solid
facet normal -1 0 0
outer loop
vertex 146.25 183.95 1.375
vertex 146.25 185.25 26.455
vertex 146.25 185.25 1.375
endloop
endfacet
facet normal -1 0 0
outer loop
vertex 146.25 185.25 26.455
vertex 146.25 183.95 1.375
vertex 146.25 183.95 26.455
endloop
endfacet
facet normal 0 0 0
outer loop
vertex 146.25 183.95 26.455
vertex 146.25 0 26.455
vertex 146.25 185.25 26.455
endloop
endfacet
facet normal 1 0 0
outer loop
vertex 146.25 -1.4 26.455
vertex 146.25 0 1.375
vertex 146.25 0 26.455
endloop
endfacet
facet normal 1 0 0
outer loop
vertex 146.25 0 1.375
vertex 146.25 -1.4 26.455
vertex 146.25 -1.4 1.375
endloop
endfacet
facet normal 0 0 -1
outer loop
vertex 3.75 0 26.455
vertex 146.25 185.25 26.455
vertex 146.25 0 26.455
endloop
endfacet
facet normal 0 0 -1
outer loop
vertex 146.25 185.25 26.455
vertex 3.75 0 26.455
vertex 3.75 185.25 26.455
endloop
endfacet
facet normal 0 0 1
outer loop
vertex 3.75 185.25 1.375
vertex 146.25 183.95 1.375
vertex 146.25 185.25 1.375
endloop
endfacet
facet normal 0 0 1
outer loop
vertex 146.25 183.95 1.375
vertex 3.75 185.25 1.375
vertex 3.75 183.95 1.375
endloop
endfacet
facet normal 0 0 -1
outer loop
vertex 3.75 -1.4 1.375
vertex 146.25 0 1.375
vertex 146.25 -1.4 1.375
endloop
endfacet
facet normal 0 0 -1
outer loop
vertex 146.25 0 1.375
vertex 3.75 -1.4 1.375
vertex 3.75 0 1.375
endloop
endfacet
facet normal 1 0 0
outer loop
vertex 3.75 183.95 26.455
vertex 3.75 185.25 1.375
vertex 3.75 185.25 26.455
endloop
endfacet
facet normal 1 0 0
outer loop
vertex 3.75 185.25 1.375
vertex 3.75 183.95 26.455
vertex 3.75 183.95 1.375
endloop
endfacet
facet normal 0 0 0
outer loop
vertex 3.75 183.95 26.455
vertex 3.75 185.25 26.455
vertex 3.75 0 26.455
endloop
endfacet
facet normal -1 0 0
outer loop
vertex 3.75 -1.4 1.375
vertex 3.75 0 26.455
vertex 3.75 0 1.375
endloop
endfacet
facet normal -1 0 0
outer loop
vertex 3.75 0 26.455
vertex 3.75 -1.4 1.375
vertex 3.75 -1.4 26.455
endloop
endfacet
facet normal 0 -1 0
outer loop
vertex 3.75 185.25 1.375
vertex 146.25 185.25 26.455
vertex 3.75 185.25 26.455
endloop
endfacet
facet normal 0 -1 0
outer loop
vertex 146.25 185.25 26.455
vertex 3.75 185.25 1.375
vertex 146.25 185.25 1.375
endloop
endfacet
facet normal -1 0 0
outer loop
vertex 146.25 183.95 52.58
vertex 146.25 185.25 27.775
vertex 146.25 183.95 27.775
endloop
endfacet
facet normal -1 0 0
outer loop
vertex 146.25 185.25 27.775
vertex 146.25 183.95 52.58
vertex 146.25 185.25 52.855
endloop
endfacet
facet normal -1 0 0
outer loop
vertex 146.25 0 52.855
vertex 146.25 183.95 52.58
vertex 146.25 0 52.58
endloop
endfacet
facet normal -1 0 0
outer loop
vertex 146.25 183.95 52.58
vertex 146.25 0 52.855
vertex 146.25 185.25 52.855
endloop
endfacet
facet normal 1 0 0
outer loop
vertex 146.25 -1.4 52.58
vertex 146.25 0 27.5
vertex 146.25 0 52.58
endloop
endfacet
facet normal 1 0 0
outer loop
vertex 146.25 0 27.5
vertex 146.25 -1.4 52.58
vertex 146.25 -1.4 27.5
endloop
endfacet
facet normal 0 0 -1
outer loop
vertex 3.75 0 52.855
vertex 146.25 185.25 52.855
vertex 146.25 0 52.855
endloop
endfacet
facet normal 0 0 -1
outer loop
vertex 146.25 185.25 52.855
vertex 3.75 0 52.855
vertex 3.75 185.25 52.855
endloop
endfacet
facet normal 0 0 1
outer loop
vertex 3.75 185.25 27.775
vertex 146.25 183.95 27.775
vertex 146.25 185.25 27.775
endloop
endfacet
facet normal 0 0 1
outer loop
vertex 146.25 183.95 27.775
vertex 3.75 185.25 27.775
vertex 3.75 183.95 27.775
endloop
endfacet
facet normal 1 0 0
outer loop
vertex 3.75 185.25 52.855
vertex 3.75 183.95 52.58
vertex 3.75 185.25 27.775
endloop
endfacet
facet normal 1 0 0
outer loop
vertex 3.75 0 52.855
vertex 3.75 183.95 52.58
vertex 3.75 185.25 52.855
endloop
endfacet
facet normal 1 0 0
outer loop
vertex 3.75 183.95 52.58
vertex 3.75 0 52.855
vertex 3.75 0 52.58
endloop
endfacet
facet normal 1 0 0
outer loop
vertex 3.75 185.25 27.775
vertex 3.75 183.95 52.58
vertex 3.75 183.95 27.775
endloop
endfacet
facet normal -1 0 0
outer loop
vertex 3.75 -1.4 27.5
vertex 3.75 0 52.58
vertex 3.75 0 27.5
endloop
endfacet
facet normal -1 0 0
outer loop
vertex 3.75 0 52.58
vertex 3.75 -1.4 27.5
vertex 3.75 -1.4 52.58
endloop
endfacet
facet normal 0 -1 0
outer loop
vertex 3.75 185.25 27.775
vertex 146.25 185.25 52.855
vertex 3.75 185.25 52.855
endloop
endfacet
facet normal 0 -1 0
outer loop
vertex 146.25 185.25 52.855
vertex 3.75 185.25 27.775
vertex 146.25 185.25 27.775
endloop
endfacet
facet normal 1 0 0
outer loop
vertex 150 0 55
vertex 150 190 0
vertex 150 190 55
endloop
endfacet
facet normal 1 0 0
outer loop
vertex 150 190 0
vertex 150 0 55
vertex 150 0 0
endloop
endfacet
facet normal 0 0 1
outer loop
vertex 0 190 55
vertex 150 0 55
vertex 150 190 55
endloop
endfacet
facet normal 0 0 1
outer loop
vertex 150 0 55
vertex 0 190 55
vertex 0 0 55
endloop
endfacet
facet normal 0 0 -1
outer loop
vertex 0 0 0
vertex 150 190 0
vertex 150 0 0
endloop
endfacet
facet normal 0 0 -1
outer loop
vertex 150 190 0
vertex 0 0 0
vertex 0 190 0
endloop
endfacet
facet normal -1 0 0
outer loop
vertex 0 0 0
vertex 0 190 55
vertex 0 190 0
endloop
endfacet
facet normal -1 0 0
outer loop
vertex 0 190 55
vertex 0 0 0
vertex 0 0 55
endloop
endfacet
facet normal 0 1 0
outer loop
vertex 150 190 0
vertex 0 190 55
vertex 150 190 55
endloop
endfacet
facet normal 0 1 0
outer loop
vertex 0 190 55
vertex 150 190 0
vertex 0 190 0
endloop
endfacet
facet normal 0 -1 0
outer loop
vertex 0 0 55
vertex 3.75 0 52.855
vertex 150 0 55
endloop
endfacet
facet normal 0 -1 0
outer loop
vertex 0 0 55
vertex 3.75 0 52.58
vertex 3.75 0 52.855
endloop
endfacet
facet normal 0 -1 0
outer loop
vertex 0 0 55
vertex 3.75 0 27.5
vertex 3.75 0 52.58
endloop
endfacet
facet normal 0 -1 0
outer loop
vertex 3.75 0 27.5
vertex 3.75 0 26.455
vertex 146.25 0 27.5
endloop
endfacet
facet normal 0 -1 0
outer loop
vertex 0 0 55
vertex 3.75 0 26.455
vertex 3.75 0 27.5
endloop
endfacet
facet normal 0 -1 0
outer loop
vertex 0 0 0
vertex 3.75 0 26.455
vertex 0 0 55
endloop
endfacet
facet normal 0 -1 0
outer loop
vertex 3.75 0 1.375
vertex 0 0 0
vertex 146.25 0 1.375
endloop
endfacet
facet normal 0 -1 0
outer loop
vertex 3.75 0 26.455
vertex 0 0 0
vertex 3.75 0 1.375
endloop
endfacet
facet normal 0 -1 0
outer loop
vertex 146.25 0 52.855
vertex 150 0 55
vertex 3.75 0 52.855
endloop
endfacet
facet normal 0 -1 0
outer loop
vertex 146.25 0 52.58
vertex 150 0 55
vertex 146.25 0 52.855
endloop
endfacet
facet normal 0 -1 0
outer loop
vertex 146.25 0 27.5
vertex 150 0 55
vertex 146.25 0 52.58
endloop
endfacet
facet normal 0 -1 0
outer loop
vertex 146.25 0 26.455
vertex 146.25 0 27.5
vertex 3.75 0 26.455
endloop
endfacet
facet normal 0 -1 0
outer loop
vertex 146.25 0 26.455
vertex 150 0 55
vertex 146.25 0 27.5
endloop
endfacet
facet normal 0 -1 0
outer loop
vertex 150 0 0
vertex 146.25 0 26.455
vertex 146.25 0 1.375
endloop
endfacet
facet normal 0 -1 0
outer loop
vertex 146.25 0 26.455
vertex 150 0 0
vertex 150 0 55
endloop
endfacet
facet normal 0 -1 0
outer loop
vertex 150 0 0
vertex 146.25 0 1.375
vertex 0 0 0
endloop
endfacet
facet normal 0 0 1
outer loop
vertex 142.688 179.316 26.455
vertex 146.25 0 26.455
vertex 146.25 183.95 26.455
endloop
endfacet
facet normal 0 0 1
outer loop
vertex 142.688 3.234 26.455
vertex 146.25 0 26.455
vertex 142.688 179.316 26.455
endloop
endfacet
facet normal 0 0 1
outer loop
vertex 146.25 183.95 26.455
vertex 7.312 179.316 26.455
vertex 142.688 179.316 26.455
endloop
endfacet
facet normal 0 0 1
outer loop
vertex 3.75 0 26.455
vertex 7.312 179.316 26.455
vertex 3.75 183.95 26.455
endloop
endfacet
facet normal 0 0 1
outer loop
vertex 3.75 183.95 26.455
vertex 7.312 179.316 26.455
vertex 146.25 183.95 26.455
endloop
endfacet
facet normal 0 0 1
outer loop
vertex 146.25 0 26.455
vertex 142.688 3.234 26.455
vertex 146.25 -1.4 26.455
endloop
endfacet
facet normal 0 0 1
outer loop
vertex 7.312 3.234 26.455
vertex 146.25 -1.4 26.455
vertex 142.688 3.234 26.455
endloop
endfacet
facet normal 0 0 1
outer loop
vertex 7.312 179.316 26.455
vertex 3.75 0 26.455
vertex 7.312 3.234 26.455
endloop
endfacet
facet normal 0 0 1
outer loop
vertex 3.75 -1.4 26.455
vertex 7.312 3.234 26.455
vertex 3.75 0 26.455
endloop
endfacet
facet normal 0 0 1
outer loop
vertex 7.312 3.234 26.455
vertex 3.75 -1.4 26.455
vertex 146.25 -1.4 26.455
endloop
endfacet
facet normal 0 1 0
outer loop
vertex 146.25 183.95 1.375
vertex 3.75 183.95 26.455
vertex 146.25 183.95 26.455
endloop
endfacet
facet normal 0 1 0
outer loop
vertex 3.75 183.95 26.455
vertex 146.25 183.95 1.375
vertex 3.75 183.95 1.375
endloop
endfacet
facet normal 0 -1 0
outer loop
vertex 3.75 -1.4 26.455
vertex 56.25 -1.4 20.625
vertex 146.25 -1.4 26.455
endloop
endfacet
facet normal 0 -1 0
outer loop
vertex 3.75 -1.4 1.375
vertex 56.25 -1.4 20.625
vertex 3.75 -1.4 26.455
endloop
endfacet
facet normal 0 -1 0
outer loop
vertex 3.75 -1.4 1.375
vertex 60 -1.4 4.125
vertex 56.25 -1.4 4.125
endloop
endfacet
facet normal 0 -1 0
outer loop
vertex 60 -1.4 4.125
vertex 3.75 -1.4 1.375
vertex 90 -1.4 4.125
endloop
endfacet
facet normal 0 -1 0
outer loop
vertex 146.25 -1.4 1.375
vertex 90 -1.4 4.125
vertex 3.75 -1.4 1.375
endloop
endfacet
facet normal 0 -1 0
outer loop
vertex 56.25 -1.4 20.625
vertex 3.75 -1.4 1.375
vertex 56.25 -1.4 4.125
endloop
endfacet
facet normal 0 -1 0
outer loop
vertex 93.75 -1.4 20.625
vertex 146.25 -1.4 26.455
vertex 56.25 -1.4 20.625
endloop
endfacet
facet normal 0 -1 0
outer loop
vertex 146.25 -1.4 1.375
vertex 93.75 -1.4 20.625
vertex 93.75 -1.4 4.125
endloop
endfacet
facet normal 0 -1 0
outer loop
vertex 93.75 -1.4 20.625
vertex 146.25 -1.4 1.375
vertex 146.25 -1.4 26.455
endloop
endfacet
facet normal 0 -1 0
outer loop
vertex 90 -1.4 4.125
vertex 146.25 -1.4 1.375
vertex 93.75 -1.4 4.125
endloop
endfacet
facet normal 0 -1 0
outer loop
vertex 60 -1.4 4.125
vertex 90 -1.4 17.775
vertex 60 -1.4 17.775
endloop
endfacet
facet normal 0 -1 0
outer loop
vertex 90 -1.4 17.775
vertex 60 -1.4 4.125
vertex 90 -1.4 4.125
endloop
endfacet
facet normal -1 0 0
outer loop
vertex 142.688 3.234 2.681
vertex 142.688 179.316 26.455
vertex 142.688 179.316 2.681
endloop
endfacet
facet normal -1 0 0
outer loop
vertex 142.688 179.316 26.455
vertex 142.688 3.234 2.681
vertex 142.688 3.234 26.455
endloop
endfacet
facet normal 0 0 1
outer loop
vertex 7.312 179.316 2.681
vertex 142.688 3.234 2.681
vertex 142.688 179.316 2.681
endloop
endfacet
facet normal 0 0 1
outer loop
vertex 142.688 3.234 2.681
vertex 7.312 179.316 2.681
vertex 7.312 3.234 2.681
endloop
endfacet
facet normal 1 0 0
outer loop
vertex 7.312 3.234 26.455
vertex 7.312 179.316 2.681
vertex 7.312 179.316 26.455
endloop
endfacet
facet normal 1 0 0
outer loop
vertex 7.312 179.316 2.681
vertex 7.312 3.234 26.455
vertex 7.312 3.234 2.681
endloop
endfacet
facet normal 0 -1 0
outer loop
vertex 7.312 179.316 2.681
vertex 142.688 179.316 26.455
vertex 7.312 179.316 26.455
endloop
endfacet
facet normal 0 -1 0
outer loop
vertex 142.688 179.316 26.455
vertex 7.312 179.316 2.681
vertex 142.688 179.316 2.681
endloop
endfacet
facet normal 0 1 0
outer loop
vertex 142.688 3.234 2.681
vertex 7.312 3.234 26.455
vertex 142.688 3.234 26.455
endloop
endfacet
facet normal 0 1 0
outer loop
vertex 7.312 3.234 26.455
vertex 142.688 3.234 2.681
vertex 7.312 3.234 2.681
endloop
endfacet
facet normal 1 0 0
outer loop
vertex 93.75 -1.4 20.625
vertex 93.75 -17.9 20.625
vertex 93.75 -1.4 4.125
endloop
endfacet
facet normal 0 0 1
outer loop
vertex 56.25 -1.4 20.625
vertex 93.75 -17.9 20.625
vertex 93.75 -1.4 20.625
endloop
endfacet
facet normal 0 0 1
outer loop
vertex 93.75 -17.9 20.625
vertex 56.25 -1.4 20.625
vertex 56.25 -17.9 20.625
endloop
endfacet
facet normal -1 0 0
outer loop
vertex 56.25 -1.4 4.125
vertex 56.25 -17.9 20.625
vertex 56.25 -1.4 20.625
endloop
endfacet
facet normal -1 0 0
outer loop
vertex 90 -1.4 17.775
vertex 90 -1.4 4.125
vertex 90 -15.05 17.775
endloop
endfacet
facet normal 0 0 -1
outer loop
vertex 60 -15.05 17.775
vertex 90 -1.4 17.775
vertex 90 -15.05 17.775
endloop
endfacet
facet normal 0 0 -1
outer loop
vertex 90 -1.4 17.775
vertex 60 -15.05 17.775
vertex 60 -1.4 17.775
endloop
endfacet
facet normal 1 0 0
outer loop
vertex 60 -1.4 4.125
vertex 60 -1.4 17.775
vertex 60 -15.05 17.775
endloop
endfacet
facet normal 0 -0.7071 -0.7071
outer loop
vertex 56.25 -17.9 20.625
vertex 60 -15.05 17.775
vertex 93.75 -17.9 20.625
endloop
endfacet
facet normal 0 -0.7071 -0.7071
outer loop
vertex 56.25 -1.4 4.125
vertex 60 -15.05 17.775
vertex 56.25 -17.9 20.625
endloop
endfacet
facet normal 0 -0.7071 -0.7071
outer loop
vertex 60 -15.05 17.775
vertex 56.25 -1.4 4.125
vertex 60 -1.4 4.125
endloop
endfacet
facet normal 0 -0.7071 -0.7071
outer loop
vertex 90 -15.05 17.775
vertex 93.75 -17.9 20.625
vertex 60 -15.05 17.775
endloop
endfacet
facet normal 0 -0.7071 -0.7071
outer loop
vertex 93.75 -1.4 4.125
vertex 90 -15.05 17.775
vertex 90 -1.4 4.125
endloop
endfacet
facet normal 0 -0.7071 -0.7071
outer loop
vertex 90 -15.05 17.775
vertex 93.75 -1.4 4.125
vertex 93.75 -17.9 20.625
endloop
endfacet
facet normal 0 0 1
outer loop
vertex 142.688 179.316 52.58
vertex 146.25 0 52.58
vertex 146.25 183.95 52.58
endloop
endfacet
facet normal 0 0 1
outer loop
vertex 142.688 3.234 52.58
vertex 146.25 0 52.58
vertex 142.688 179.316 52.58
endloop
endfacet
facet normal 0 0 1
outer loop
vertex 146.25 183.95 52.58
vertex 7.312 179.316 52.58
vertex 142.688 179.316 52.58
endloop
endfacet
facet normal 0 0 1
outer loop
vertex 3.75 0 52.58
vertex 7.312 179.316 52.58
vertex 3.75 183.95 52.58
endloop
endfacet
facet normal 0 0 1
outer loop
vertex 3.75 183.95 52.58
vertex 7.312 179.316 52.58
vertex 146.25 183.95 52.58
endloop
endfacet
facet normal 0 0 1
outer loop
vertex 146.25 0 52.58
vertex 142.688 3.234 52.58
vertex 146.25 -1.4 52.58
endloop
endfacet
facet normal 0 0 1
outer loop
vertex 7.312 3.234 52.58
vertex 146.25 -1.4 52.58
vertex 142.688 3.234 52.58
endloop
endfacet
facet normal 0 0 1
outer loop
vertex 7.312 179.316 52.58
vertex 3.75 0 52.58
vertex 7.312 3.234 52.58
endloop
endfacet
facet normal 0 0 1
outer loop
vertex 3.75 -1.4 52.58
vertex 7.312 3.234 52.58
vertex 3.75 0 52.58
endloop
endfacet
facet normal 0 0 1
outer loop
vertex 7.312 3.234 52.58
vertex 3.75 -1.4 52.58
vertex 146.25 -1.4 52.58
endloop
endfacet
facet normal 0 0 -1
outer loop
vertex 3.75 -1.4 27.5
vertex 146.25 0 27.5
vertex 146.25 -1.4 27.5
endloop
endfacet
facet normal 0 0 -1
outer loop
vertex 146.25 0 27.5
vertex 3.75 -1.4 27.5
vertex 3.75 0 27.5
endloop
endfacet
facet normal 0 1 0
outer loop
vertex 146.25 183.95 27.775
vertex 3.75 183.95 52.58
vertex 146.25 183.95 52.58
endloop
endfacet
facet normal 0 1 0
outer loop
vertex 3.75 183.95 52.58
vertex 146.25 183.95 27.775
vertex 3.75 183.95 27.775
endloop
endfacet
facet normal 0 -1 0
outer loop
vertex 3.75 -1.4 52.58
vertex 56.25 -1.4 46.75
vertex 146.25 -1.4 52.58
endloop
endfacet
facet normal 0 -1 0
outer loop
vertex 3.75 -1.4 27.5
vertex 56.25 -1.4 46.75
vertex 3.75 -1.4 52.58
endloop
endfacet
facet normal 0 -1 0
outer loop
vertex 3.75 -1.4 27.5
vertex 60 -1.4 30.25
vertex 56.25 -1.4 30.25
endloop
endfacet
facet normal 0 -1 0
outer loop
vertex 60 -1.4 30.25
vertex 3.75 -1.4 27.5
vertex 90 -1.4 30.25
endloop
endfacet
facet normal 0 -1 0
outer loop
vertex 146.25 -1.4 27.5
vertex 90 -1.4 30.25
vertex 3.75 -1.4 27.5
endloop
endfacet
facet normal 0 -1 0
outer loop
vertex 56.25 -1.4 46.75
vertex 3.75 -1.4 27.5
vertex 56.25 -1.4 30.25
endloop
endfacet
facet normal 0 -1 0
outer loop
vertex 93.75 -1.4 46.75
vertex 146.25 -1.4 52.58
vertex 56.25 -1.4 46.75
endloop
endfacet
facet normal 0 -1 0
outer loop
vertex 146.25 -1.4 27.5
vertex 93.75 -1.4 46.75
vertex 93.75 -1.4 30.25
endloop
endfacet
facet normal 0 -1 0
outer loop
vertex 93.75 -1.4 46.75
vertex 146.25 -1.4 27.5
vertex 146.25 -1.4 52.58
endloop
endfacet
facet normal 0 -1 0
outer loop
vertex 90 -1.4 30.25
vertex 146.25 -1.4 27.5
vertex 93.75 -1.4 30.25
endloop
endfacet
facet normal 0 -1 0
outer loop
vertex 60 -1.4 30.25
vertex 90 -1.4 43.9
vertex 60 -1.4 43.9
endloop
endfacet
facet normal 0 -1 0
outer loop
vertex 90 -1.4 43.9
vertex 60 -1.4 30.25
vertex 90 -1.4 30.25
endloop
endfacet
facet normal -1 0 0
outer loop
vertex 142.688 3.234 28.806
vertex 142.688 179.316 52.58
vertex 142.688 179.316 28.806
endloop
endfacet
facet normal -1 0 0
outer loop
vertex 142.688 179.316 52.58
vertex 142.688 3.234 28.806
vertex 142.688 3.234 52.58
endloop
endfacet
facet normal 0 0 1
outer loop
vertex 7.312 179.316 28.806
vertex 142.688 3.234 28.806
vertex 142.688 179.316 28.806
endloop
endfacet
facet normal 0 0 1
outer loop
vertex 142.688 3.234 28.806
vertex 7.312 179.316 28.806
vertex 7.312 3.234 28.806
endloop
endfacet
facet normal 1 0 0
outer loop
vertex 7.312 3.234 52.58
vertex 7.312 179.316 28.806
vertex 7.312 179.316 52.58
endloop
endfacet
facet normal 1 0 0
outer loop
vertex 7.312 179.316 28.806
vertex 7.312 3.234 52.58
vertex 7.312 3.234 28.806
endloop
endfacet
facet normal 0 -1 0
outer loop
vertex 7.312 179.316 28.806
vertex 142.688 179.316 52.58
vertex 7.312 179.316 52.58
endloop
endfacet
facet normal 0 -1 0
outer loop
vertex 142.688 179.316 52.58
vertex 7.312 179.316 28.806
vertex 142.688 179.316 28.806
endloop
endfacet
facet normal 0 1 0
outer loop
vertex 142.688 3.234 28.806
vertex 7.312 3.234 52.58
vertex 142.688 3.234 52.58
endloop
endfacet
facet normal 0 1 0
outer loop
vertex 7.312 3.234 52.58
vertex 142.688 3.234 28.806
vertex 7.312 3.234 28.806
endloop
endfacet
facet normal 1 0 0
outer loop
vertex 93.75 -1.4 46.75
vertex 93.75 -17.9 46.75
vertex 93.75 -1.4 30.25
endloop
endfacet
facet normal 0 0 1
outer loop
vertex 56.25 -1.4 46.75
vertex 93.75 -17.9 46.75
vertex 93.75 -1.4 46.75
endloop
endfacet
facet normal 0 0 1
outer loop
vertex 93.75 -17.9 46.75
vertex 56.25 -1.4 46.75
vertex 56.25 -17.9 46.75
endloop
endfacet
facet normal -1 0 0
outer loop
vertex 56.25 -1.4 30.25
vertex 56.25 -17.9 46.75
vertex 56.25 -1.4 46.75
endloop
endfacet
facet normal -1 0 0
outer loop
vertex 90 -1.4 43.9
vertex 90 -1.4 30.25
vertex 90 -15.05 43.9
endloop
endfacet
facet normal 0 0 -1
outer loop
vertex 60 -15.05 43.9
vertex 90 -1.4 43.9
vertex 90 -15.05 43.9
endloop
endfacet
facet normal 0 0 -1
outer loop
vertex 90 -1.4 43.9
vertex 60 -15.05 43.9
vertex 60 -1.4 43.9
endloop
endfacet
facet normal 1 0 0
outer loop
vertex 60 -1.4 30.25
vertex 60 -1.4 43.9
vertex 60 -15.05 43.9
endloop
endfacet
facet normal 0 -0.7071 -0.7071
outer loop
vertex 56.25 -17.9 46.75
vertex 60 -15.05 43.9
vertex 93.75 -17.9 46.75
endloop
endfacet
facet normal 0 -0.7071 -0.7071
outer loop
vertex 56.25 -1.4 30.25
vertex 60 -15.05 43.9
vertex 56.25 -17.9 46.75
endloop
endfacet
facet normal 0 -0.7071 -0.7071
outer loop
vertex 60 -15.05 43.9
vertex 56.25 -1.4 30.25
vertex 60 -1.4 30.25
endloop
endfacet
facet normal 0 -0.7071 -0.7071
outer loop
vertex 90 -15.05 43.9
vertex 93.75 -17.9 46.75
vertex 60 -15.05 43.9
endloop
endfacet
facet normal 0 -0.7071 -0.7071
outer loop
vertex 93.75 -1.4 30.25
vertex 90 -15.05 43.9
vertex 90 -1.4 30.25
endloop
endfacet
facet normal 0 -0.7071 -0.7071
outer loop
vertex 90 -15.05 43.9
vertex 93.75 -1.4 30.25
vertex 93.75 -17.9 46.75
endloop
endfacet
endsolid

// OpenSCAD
$fn=10;

width = 150;
length = 190;
heighth = 55;

module drawer_case(width, length, heighth){
	difference(){
		cube([width, length, heighth]);
		translate([(width*.05)/2,-.1,(heighth*.05)/2]){
			scale([1,1,.48]){
				cube([width-(width*.05),length-(length*.025)+.1,heighth-(heighth*.05)]);
				translate([0,0,heighth]){
					cube([width-(width*.05),length-(length*.025)+.1,heighth-(heighth*.05)]);
				}
			}
		}
	}
}

module drawer_shell(width, length, heighth){
	d_width = width-(width*.05);
	d_length = length-(length*.025)+.1;
	d_heighth = heighth-(heighth*.05);
	difference(){
		scale([1,1,.48]){
			cube([d_width, d_length, d_heighth]);
		}
		translate([(d_width*.05)/2,(d_length*.025),(d_heighth*.05)/2]){
			scale([.95,.95,.95]){
				cube([d_width, d_length,d_heighth*.48]);
			}
		}
	}
}

module drawer_handle(width,length,heighth){
	difference(){
		difference(){	
			cube([width*.25,length*.10,heighth*.30]);
			translate([width*.025,-.1,-.1]){
				cube([width*.20,length*.20,heighth*.25]);
			}
		}
		translate([-2,length*.10,0]){
			rotate([135,0,0]){
				cube([width,length*.15,heighth*.30]);
			}
		}
	}

}

module drawer(width,length,heighth){
	translate([0,10,0]){
		drawer_shell(width,length,heighth);
		translate([width*.35,-length*.10,heighth*.05]){
			drawer_handle(width,length,heighth);
		}
	}
}




drawer_case(width,length,heighth);
translate([(width*.05)/2,-length*.06,]){
	translate([0,0,(heighth*.05)/2]){
		drawer(width,length,heighth);
	}
	translate([0,0,heighth-(heighth*.5)]){
		drawer(width,length,heighth);
	}
}
//translate([width+2,0,0]){
//	drawer_shell(width,length,heighth);
//}
//
//translate([width*2,0,0]){
//	drawer_handle(width,length,heighth);
//}

	
